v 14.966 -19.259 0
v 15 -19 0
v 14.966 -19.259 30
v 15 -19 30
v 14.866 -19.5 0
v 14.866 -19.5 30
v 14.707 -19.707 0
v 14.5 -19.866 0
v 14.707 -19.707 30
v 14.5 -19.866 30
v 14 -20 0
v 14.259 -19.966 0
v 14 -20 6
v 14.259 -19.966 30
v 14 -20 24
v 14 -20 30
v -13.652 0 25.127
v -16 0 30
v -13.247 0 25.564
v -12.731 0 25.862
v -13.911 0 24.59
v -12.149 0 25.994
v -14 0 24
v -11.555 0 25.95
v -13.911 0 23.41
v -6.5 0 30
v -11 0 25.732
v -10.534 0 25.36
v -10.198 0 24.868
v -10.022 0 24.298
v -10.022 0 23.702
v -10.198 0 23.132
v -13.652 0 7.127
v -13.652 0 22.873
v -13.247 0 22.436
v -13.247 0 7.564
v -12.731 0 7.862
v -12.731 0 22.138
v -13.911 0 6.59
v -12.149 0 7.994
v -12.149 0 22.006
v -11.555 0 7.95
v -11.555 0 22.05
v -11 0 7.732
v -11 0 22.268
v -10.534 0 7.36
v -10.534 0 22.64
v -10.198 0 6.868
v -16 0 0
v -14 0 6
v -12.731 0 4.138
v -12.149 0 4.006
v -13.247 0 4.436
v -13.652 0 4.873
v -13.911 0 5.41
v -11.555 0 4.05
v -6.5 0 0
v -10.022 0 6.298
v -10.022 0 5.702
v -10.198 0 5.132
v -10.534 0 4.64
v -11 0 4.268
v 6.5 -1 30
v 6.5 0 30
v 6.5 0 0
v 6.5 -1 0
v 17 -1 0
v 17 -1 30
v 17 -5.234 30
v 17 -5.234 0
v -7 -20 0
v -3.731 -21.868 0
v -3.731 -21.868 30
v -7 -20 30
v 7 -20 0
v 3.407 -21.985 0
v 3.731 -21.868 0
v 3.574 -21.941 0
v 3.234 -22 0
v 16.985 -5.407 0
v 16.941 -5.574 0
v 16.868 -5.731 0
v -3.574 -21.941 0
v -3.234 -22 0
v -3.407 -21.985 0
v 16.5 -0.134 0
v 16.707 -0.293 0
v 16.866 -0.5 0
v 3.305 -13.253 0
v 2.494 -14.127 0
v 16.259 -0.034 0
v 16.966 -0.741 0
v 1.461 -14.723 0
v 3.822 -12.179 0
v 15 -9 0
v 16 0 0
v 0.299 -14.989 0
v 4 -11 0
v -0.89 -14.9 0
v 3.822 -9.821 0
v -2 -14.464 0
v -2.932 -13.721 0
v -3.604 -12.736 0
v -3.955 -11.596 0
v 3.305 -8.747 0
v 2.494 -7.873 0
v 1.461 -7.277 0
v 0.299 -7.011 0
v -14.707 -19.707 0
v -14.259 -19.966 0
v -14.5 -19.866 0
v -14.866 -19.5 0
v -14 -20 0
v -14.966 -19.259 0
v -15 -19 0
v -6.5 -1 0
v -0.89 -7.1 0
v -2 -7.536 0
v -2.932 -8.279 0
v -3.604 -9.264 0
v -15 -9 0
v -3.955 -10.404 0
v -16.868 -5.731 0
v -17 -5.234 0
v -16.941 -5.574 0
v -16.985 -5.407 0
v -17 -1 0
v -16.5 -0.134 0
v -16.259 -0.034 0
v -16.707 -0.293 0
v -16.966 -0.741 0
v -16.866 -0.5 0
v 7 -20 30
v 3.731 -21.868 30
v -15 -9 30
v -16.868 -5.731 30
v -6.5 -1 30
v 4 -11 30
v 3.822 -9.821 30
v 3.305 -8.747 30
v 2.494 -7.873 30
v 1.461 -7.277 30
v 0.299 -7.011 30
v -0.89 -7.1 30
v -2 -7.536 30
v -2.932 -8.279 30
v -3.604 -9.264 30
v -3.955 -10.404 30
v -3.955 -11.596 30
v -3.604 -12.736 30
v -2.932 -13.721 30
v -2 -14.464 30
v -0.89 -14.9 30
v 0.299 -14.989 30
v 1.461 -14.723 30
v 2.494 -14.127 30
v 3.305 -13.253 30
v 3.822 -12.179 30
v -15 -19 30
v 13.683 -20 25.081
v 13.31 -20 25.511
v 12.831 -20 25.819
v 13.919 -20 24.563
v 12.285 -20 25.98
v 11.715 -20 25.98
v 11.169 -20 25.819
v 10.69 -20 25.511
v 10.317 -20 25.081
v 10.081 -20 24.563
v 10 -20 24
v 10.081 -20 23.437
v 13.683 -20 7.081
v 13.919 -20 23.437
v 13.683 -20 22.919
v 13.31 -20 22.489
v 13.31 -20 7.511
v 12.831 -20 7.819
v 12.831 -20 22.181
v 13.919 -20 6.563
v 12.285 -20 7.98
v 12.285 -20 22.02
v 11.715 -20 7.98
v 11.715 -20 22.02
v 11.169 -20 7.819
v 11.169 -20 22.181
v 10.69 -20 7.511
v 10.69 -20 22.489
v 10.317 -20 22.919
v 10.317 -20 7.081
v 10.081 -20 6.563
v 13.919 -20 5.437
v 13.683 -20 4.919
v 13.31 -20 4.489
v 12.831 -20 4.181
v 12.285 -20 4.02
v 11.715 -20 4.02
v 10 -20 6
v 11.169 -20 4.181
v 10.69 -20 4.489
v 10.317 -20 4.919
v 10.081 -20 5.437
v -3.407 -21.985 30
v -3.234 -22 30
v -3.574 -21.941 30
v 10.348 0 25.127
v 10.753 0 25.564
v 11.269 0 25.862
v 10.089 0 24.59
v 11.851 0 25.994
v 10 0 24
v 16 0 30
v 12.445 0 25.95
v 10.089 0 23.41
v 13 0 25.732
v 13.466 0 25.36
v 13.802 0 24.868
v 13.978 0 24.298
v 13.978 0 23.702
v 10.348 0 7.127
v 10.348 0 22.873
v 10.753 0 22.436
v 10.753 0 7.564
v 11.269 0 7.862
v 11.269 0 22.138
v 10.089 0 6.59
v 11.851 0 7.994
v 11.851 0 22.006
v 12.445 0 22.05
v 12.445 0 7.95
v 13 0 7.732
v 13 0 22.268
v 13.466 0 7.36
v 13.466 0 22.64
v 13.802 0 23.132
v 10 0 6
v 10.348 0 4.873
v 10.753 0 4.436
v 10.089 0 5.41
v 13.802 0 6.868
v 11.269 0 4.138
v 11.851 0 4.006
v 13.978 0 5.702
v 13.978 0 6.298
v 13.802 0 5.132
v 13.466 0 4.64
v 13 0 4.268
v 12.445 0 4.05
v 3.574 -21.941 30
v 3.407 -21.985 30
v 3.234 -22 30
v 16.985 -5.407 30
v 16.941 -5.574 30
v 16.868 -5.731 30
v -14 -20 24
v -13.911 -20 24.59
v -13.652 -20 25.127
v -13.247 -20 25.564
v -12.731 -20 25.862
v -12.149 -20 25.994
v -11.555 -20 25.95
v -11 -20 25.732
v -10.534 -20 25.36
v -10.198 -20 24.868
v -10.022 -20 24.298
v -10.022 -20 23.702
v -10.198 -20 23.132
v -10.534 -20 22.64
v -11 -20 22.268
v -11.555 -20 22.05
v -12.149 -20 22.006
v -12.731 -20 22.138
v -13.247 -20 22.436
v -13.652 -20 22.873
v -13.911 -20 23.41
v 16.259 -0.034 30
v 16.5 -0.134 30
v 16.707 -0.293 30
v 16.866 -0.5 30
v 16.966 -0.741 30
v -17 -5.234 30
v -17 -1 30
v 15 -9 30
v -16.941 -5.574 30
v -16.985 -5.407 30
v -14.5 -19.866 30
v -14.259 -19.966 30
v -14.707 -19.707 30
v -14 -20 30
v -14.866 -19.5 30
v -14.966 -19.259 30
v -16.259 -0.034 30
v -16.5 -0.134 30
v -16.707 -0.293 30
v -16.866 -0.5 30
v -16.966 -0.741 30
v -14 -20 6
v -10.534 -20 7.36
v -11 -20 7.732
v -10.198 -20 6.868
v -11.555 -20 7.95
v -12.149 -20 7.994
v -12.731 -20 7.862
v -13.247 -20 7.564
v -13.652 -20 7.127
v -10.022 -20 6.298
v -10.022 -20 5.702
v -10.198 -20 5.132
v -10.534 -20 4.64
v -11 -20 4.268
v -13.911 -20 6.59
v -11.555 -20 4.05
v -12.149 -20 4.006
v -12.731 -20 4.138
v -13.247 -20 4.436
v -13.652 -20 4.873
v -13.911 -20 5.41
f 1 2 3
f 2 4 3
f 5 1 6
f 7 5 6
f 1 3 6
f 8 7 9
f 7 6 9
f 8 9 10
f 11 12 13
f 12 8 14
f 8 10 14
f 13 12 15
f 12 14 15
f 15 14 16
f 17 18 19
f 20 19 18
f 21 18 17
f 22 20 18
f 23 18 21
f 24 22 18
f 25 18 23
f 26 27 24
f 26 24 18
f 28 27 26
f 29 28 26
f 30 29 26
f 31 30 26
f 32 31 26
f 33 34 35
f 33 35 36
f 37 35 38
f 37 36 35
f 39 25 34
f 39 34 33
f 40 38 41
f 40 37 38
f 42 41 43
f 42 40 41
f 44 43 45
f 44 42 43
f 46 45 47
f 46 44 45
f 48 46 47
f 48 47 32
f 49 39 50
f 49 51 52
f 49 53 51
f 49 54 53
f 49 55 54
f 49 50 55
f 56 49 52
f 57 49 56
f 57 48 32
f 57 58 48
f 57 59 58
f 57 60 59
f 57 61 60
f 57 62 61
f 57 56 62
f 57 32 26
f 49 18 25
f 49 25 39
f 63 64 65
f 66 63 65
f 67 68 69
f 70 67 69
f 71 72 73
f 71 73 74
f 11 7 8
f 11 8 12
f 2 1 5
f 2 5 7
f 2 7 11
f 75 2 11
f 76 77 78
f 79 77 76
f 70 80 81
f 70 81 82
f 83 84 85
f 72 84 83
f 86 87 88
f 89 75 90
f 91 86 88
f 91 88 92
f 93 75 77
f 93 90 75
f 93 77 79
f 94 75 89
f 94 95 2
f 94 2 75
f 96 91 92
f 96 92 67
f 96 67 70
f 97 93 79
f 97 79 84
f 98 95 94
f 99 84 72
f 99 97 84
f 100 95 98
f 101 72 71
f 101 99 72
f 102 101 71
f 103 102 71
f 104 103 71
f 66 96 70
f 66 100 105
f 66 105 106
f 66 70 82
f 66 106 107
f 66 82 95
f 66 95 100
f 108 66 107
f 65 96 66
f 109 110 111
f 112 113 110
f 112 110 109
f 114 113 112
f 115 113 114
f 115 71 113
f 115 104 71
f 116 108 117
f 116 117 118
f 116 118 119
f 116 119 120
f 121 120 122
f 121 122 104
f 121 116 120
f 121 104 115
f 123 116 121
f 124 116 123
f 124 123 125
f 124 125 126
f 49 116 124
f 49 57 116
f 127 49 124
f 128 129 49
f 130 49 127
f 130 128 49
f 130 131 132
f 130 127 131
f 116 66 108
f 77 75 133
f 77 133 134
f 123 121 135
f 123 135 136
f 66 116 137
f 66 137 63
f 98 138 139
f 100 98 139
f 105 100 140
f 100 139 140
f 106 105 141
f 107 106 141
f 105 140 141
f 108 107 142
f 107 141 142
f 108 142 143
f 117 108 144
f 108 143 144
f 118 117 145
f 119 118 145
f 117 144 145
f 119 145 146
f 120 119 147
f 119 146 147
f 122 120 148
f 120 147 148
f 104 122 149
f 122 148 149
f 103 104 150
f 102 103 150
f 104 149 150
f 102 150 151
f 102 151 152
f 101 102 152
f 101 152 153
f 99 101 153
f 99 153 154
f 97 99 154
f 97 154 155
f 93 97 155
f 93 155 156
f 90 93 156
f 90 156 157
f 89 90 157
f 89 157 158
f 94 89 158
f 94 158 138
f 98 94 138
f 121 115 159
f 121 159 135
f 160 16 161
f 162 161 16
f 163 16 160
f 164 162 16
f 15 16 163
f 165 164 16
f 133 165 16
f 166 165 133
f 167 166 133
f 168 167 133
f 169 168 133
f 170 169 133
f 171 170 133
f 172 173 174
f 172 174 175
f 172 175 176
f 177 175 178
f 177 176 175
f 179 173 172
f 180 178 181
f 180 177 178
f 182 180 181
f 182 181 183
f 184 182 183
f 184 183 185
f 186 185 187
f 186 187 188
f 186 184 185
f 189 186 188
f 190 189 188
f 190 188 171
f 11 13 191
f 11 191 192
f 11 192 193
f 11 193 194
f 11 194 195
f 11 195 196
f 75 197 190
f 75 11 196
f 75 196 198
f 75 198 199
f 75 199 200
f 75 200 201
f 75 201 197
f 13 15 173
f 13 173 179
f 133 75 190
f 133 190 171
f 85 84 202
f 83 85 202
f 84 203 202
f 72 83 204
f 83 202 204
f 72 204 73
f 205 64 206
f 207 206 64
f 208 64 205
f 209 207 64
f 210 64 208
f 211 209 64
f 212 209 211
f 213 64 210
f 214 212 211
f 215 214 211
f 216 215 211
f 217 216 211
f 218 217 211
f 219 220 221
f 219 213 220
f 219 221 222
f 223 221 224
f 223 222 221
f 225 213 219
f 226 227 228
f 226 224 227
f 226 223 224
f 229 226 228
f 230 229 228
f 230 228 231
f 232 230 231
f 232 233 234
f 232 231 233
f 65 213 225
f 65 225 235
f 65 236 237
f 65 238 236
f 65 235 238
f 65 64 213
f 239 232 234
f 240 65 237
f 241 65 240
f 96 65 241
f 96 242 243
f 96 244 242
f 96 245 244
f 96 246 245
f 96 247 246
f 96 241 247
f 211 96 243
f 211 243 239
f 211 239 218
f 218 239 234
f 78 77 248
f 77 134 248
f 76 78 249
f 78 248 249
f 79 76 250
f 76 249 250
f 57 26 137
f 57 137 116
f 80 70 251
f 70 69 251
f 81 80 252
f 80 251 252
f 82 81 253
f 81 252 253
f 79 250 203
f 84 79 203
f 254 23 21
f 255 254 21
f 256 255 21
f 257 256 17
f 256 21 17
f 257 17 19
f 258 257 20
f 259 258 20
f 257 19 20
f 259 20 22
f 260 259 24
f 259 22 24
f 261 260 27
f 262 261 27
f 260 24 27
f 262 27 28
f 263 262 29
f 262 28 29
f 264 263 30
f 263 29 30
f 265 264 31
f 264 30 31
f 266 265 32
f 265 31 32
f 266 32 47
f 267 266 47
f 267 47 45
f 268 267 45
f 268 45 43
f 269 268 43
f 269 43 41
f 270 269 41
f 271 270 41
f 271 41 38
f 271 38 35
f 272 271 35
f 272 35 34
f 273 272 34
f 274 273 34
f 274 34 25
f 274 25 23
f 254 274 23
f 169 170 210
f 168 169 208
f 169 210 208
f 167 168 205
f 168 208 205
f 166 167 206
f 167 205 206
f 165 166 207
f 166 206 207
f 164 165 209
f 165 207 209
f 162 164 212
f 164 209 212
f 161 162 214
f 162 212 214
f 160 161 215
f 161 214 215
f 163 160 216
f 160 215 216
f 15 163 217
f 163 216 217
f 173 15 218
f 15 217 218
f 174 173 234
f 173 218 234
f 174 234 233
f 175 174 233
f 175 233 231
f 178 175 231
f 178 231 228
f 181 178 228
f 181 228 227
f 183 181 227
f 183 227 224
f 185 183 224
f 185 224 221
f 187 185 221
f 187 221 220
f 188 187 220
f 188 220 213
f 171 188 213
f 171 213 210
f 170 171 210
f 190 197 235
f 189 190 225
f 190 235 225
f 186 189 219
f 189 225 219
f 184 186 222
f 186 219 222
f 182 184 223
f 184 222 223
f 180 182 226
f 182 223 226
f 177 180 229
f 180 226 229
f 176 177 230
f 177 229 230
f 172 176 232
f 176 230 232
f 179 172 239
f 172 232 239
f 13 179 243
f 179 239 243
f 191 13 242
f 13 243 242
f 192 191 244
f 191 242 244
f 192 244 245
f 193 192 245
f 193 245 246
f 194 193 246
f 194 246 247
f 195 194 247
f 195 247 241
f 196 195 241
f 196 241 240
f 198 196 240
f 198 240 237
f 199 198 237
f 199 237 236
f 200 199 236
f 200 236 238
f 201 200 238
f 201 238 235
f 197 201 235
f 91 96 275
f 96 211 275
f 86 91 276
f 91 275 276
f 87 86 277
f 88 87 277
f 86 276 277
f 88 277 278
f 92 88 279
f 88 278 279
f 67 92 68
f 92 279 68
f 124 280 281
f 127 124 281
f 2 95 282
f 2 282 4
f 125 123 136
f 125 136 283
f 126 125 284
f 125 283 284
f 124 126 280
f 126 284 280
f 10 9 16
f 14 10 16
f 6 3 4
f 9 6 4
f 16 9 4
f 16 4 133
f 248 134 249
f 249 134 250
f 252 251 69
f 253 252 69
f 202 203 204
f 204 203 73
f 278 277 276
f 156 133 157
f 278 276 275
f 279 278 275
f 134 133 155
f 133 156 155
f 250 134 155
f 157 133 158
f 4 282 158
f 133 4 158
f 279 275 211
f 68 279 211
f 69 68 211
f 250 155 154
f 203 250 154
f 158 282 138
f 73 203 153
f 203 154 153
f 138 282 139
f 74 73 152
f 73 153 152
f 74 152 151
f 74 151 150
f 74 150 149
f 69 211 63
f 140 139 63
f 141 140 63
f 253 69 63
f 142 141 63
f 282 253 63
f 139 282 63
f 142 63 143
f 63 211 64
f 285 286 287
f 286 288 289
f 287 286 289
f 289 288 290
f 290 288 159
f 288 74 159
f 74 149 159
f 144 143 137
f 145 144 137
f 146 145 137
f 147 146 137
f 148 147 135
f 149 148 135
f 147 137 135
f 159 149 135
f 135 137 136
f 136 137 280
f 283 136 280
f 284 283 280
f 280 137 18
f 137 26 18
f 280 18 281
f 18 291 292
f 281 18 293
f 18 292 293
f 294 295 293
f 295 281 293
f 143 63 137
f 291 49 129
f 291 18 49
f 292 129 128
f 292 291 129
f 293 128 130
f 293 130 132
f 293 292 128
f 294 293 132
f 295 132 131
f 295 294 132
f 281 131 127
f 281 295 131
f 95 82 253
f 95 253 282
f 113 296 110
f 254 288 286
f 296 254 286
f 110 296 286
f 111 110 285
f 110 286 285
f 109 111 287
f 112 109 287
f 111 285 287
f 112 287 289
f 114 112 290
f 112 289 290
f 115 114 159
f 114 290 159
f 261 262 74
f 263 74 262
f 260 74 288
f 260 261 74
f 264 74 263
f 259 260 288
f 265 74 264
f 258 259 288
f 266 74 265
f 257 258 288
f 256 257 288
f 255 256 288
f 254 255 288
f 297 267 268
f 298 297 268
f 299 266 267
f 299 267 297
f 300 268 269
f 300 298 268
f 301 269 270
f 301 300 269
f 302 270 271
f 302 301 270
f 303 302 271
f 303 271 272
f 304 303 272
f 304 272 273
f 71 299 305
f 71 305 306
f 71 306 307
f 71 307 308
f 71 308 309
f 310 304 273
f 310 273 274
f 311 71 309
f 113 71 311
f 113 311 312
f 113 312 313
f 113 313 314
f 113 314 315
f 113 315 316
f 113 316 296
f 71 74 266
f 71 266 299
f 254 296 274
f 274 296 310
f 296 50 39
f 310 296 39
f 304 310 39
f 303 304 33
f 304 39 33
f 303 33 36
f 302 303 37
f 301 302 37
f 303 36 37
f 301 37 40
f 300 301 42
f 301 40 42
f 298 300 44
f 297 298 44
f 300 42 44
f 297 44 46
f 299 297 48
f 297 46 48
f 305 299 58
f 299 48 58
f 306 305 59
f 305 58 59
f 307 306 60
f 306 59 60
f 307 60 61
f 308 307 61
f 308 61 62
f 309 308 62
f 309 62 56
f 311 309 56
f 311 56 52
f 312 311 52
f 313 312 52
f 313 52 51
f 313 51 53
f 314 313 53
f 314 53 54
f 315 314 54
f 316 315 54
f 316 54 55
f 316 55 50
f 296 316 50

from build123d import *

# Parameters (mm, degrees)
BOSS_EXTRUDE1_DEPTH = 30
FILLET1_R           = 1
CUT_EXTRUDE1_REACH  = 42.902
SKETCH2_R           = 4
CUT_EXTRUDE2_REACH  = 42.902
SKETCH3_R           = 2
SKETCH4_W           = 13
SKETCH4_H           = 30
CUT_EXTRUDE3_DEPTH  = 1


with BuildPart() as part:
    # Sketch1 → Boss-Extrude1 (new body)
    with BuildSketch(Plane.XY):
        Polygon((-17, 0), (17, 0), (17, -5.5), (15, -9), (15, -20), (7, -20), (3.5, -22), (-3.5, -22), (-7, -20), (-15, -20), (-15, -9), (-17, -5.5), align=None)
    extrude(amount=BOSS_EXTRUDE1_DEPTH)

    # Fillet1
    fillet1_edges = [part.edges().sort_by_distance(p)[0] for p in [
        (-17, 0, 15),
        (17, 0, 15),
        (17, -5.5, 15),
        (15, -20, 15),
        (3.5, -22, 15),
        (-3.5, -22, 15),
        (-15, -20, 15),
        (-17, -5.5, 15),
    ]]
    fillet(fillet1_edges, radius=FILLET1_R)

    # Sketch2 → Cut-Extrude1 (cut, up to next)
    with BuildSketch(Plane.XY.offset(30), mode=Mode.PRIVATE) as cut_extrude1_sk1:
        with Locations((0, -11)):
            Circle(SKETCH2_R)
    cut_extrude1_tool1 = extrude(cut_extrude1_sk1.sketch, amount=-CUT_EXTRUDE1_REACH, mode=Mode.PRIVATE) & part.part
    add(cut_extrude1_tool1.solids().sort_by_distance((0, -11, 30))[0], mode=Mode.SUBTRACT)

    # Sketch3 → Cut-Extrude2 (cut, up to next)
    with BuildSketch(Plane(origin=(0, 0, 0), x_dir=(1, 0, 0), z_dir=(0, 1, 0)), mode=Mode.PRIVATE) as cut_extrude2_sk1:
        with Locations(Location((-12, -6, 0), (0, 0, 180))):
            Circle(SKETCH3_R)
    cut_extrude2_tool1 = extrude(cut_extrude2_sk1.sketch, amount=-CUT_EXTRUDE2_REACH, mode=Mode.PRIVATE) & part.part
    # Sketch3 → Cut-Extrude2 (cut, up to next)
    with BuildSketch(Plane(origin=(0, 0, 0), x_dir=(1, 0, 0), z_dir=(0, 1, 0)), mode=Mode.PRIVATE) as cut_extrude2_sk2:
        with Locations(Location((-12, -24, 0), (0, 0, 180))):
            Circle(SKETCH3_R)
    cut_extrude2_tool2 = extrude(cut_extrude2_sk2.sketch, amount=-CUT_EXTRUDE2_REACH, mode=Mode.PRIVATE) & part.part
    # Sketch3 → Cut-Extrude2 (cut, up to next)
    with BuildSketch(Plane(origin=(0, 0, 0), x_dir=(1, 0, 0), z_dir=(0, 1, 0)), mode=Mode.PRIVATE) as cut_extrude2_sk3:
        with Locations(Location((12, -24, 0), (0, 0, 180))):
            Circle(SKETCH3_R)
    cut_extrude2_tool3 = extrude(cut_extrude2_sk3.sketch, amount=-CUT_EXTRUDE2_REACH, mode=Mode.PRIVATE) & part.part
    # Sketch3 → Cut-Extrude2 (cut, up to next)
    with BuildSketch(Plane(origin=(0, 0, 0), x_dir=(1, 0, 0), z_dir=(0, 1, 0)), mode=Mode.PRIVATE) as cut_extrude2_sk4:
        with Locations(Location((12, -6, 0), (0, 0, 180))):
            Circle(SKETCH3_R)
    cut_extrude2_tool4 = extrude(cut_extrude2_sk4.sketch, amount=-CUT_EXTRUDE2_REACH, mode=Mode.PRIVATE) & part.part
    add(cut_extrude2_tool1.solids().sort_by_distance((-12, 0, 6))[0], mode=Mode.SUBTRACT)
    add(cut_extrude2_tool2.solids().sort_by_distance((-12, 0, 24))[0], mode=Mode.SUBTRACT)
    add(cut_extrude2_tool3.solids().sort_by_distance((12, 0, 24))[0], mode=Mode.SUBTRACT)
    add(cut_extrude2_tool4.solids().sort_by_distance((12, 0, 6))[0], mode=Mode.SUBTRACT)

    # Sketch4 → Cut-Extrude3 (cut)
    with BuildSketch(Plane(origin=(0, 0, 0), x_dir=(1, 0, 0), z_dir=(0, 1, 0))):
        with Locations((0, -15)):
            Rectangle(SKETCH4_W, SKETCH4_H)
    extrude(amount=-CUT_EXTRUDE3_DEPTH, mode=Mode.SUBTRACT)


solid = part.part
